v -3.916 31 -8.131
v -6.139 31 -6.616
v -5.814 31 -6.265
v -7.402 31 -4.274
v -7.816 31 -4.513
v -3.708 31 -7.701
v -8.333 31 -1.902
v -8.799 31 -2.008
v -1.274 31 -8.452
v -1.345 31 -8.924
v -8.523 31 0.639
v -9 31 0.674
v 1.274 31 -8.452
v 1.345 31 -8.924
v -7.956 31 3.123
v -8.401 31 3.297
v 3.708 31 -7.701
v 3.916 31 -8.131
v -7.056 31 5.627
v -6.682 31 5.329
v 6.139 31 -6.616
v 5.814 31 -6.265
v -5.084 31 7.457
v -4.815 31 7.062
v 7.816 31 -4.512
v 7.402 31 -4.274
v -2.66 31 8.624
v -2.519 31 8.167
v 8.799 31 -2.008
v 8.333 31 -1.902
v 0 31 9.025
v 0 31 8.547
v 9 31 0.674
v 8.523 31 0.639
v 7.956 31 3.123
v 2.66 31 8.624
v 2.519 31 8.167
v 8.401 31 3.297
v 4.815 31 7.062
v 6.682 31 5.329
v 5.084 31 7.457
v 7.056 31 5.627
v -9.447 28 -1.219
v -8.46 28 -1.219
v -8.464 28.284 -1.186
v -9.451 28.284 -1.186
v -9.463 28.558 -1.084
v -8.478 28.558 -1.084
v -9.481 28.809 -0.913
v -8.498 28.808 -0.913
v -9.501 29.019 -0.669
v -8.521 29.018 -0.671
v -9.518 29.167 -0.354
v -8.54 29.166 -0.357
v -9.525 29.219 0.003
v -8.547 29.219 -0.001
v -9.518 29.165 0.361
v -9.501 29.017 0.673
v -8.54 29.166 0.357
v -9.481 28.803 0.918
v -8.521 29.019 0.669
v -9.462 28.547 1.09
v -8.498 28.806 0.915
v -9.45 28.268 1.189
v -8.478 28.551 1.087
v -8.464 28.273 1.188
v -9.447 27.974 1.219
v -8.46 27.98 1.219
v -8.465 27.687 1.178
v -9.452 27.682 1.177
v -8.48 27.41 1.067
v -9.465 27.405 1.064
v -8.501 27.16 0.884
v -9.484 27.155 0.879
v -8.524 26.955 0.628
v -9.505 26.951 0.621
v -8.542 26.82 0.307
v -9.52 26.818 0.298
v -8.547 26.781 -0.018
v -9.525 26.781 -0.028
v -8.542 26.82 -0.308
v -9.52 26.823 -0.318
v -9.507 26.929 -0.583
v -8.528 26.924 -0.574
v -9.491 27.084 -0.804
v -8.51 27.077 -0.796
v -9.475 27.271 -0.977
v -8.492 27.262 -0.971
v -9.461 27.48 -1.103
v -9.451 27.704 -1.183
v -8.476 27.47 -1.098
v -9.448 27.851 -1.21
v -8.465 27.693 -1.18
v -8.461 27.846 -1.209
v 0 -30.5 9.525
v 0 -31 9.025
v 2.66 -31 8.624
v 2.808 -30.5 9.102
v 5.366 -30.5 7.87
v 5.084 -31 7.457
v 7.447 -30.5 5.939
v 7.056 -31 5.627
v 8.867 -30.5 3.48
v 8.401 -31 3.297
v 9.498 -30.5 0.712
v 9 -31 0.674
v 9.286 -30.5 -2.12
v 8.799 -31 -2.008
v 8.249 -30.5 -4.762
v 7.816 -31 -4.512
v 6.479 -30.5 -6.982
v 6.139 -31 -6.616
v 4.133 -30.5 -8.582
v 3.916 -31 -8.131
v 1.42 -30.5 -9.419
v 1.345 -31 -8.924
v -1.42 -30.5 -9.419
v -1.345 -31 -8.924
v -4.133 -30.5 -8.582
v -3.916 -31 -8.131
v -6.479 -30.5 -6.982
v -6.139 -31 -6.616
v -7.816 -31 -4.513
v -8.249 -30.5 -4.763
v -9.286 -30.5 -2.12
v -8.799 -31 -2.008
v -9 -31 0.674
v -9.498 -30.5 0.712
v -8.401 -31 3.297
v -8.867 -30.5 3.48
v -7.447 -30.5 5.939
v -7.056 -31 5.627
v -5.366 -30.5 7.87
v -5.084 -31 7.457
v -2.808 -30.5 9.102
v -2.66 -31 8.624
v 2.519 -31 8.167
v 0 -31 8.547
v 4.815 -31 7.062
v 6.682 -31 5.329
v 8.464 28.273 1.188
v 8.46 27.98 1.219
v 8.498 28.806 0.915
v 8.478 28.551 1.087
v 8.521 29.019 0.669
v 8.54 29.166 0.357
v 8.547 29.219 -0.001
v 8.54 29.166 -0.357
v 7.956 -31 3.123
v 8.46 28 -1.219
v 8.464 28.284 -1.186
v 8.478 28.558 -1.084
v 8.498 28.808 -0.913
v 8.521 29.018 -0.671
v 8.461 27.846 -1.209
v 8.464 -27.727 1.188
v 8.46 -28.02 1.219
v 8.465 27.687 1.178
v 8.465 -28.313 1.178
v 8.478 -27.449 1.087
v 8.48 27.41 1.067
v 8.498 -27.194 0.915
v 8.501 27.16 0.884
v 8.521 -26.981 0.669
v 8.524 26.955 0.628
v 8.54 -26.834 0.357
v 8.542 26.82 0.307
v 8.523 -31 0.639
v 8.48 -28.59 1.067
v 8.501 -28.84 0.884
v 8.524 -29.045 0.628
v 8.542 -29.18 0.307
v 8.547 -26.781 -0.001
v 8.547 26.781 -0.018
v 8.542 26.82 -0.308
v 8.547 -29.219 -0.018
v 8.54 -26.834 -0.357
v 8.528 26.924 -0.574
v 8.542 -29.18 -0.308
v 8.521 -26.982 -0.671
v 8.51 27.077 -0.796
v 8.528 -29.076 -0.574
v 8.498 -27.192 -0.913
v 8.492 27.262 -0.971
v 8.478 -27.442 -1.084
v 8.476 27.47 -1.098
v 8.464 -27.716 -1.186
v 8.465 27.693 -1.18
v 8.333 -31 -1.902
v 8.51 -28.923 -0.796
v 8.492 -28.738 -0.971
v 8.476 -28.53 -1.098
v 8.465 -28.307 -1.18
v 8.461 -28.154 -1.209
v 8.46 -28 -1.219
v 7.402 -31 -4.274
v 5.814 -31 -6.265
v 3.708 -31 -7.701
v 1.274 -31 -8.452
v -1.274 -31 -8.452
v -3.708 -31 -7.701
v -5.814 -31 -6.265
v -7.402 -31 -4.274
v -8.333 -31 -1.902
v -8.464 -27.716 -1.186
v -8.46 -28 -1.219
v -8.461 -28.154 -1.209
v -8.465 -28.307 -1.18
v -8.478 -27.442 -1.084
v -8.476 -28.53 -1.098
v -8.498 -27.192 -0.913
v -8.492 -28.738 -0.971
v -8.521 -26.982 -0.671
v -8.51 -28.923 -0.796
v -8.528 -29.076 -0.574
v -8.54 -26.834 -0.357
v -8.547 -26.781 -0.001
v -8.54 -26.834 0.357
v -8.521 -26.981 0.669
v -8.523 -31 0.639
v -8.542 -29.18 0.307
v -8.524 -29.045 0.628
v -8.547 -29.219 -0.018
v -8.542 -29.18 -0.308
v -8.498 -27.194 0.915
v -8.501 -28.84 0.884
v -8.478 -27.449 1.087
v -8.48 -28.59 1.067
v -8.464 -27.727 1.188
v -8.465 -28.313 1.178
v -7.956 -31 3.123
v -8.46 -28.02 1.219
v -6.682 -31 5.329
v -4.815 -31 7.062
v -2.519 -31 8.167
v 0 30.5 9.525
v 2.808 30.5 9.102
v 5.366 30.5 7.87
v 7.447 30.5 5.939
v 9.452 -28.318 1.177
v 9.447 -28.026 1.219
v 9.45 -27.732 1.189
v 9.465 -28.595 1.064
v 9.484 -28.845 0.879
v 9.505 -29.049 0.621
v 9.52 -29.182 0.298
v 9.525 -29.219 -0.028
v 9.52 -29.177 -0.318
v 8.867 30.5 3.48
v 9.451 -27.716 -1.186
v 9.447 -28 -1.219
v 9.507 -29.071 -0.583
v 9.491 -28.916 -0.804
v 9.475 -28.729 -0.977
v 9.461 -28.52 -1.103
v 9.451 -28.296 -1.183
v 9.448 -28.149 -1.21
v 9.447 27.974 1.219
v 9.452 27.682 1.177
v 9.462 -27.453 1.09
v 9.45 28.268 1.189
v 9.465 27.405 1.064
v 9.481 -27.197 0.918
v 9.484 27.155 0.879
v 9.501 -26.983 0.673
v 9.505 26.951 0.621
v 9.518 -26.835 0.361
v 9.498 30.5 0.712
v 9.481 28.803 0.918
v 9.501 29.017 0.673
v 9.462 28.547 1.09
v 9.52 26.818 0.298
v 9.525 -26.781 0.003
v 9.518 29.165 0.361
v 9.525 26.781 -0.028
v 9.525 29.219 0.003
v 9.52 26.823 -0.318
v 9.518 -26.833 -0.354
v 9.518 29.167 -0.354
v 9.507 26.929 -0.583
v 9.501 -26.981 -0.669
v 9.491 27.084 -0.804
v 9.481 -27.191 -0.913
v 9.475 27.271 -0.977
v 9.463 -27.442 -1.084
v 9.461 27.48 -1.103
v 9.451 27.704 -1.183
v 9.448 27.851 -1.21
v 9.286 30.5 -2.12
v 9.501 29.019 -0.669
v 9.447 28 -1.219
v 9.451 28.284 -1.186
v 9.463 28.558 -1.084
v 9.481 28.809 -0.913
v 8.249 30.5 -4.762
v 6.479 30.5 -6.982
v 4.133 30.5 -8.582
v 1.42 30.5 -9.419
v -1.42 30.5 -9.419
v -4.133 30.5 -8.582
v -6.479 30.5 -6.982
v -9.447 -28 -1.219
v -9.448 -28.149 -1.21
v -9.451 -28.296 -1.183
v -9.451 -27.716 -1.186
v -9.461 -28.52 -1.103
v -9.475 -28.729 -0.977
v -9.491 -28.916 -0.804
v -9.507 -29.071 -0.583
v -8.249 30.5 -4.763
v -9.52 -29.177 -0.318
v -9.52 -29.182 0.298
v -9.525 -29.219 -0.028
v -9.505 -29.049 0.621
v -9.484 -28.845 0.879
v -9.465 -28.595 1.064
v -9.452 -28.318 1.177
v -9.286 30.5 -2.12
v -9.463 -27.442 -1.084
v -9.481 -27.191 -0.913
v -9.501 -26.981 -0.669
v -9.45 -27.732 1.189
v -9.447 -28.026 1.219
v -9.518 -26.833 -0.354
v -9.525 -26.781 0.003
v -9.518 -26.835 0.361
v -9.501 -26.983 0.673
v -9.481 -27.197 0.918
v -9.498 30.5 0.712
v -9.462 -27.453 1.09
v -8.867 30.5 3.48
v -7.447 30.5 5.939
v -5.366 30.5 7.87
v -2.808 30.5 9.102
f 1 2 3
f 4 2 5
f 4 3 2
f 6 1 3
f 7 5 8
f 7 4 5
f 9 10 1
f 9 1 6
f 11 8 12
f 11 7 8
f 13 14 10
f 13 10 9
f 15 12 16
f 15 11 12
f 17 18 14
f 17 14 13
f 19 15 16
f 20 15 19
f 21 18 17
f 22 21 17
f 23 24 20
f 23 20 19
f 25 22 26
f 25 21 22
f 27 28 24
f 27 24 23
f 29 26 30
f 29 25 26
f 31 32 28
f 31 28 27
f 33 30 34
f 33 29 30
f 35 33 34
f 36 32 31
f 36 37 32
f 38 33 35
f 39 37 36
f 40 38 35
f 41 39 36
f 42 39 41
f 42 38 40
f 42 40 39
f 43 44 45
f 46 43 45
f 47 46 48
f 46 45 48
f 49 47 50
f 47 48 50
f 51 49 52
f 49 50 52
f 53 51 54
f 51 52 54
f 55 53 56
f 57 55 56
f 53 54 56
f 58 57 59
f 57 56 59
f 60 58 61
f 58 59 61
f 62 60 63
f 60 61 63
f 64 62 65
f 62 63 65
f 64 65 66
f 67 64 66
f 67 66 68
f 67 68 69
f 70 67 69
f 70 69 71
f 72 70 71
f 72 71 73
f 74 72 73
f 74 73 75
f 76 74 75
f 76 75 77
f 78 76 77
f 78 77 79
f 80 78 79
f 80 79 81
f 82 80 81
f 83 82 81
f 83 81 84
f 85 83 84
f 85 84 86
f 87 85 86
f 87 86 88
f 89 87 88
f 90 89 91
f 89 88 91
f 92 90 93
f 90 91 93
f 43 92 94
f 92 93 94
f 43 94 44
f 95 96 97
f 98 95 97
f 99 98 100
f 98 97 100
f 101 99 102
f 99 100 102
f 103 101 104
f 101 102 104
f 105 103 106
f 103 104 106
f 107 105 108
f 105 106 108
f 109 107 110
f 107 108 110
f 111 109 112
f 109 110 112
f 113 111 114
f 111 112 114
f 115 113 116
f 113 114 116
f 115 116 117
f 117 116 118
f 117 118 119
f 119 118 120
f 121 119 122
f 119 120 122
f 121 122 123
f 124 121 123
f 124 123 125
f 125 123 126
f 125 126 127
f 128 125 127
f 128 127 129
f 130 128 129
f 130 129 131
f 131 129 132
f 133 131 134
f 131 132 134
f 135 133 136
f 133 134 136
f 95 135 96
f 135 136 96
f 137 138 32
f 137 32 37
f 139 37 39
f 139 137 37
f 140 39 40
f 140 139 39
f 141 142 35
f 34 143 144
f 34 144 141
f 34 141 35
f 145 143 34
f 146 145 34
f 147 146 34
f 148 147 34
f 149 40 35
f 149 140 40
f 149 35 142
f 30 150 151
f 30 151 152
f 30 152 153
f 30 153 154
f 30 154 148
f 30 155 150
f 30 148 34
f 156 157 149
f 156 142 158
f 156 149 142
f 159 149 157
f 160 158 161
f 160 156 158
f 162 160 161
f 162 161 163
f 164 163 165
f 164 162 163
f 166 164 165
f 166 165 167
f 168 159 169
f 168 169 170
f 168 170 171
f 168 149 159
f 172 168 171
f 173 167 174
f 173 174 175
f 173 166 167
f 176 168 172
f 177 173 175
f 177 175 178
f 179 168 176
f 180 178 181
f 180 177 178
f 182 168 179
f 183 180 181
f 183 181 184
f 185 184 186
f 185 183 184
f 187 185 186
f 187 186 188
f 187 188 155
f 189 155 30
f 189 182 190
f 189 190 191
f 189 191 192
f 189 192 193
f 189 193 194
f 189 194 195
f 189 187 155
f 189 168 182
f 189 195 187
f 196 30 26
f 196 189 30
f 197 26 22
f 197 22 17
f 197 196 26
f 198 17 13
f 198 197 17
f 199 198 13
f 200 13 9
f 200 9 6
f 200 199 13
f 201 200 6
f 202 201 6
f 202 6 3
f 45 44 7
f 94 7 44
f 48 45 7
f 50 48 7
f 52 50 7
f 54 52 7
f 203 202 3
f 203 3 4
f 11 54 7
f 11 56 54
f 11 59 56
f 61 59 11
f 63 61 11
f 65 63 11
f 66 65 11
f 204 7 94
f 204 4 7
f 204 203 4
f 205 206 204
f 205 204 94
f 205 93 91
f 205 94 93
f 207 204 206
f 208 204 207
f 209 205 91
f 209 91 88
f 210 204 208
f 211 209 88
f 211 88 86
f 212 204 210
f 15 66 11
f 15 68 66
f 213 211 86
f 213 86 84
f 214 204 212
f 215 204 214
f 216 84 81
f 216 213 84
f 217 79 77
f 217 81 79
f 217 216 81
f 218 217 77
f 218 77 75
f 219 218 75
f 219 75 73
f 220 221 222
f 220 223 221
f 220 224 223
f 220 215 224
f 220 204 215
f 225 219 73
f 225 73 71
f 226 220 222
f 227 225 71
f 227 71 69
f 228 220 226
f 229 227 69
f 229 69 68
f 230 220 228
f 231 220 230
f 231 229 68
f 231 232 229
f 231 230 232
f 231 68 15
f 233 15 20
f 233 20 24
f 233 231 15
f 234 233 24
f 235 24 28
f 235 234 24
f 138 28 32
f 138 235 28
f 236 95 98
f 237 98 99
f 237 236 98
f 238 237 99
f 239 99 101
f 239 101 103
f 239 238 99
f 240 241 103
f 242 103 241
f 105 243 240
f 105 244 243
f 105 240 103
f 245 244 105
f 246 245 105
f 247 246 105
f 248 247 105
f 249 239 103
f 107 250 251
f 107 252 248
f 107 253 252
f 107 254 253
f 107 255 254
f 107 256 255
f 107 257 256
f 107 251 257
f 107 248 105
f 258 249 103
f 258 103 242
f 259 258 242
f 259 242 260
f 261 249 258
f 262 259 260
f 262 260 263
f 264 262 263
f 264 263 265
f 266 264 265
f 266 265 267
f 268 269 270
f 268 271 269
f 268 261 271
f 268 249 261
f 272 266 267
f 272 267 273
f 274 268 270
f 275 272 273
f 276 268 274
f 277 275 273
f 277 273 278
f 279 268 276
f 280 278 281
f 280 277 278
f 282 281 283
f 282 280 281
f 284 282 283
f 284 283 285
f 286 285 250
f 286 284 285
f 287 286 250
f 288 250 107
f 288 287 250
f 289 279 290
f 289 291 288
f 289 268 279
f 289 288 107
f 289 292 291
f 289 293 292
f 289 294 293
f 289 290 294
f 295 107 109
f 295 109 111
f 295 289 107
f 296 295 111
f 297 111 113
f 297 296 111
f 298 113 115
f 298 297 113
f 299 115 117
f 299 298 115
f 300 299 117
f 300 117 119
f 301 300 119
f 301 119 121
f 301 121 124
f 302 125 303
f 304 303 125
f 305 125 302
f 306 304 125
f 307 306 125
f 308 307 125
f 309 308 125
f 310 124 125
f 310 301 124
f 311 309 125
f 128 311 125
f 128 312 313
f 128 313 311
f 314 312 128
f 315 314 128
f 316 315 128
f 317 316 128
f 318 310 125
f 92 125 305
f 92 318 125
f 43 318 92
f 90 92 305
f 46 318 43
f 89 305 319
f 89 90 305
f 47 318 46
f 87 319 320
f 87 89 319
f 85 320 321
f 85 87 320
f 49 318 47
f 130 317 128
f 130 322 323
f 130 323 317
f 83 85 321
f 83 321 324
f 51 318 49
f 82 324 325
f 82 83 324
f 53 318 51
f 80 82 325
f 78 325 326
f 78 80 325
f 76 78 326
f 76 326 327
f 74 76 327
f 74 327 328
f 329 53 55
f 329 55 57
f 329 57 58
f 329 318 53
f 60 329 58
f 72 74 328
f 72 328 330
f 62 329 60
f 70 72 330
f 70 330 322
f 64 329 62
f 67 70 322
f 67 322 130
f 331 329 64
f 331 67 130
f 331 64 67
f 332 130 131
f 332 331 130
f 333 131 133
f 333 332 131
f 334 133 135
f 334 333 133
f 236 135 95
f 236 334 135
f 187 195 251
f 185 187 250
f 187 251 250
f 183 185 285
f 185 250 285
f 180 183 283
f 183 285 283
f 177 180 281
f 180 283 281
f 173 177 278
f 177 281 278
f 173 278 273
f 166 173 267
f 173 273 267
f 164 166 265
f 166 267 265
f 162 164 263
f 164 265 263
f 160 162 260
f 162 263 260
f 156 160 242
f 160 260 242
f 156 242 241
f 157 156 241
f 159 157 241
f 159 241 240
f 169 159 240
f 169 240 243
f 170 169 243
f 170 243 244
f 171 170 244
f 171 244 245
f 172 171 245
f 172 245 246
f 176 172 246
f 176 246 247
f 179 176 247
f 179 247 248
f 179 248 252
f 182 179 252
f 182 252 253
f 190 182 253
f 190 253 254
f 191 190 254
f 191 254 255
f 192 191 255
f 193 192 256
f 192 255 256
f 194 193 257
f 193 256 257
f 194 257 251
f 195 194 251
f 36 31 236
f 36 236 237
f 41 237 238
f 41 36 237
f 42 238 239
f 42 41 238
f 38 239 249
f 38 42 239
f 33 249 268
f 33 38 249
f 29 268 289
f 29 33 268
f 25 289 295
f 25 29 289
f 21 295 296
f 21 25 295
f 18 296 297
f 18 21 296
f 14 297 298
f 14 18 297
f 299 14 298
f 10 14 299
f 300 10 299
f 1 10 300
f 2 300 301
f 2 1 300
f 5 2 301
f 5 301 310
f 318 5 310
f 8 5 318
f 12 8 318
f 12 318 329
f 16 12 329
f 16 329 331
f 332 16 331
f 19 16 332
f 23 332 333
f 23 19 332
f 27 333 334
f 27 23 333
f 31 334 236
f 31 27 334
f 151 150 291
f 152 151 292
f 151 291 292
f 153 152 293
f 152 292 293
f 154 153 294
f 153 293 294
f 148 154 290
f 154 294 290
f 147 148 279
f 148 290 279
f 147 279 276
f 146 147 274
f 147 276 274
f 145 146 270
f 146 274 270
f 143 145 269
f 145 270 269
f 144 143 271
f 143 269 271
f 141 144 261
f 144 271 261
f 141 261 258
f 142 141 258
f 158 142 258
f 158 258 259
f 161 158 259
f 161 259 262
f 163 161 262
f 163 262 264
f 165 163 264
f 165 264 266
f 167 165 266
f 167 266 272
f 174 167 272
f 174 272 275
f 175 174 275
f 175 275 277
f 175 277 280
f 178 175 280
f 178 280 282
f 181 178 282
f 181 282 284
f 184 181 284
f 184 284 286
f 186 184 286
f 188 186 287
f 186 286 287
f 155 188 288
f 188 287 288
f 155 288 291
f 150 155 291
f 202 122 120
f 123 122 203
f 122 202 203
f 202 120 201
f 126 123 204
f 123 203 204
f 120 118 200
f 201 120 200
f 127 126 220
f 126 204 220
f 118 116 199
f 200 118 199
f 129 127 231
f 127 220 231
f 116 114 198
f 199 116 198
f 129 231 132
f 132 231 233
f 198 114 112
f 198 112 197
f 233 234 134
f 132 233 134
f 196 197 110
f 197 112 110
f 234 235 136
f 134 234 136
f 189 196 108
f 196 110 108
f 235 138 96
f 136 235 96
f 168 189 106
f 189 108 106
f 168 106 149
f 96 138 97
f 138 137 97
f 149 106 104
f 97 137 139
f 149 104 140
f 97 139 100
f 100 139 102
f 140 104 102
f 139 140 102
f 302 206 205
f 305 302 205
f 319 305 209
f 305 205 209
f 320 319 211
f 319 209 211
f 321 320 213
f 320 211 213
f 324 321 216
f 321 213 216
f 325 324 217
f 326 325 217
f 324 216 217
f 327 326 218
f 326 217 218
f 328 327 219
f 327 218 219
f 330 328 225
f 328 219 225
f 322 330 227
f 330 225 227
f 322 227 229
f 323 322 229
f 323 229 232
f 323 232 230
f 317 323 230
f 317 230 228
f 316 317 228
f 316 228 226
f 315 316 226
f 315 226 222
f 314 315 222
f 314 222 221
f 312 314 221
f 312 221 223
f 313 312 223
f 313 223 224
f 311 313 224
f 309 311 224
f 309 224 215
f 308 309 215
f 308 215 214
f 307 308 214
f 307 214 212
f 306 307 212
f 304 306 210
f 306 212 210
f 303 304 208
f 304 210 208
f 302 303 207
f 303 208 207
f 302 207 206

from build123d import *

# Parameters (mm, degrees)
SKETCH1_R                   = 9.525
SKETCH1_R_2                 = 8.5471
BOSS_EXTRUDE1_DEPTH         = 31
F_41_0_096_DIAMETER_HOLE1_D = 2.4384
CHAMFER1_SIZE               = 0.5


with BuildPart() as part:
    # Sketch1 → Boss-Extrude1 (new, symmetric)
    with BuildSketch(Plane(origin=(0, 0, 0), x_dir=(1, 0, 0), z_dir=(0, 1, 0))):
        Circle(SKETCH1_R)
        Circle(SKETCH1_R_2, mode=Mode.SUBTRACT)
    extrude(amount=BOSS_EXTRUDE1_DEPTH, both=True)

    # #41 (0.096) Diameter Hole1 (through all)
    with Locations(Plane.ZY.offset(9.525)):
        with Locations((0, 28), (0, -28)):
            Hole(F_41_0_096_DIAMETER_HOLE1_D / 2)

    # Chamfer1
    chamfer1_edges = [part.edges().sort_by_distance(p)[0] for p in [
        (-9.525, 31, 0),
        (-9.525, -31, 0),
    ]]
    chamfer(chamfer1_edges, length=CHAMFER1_SIZE)


solid = part.part
